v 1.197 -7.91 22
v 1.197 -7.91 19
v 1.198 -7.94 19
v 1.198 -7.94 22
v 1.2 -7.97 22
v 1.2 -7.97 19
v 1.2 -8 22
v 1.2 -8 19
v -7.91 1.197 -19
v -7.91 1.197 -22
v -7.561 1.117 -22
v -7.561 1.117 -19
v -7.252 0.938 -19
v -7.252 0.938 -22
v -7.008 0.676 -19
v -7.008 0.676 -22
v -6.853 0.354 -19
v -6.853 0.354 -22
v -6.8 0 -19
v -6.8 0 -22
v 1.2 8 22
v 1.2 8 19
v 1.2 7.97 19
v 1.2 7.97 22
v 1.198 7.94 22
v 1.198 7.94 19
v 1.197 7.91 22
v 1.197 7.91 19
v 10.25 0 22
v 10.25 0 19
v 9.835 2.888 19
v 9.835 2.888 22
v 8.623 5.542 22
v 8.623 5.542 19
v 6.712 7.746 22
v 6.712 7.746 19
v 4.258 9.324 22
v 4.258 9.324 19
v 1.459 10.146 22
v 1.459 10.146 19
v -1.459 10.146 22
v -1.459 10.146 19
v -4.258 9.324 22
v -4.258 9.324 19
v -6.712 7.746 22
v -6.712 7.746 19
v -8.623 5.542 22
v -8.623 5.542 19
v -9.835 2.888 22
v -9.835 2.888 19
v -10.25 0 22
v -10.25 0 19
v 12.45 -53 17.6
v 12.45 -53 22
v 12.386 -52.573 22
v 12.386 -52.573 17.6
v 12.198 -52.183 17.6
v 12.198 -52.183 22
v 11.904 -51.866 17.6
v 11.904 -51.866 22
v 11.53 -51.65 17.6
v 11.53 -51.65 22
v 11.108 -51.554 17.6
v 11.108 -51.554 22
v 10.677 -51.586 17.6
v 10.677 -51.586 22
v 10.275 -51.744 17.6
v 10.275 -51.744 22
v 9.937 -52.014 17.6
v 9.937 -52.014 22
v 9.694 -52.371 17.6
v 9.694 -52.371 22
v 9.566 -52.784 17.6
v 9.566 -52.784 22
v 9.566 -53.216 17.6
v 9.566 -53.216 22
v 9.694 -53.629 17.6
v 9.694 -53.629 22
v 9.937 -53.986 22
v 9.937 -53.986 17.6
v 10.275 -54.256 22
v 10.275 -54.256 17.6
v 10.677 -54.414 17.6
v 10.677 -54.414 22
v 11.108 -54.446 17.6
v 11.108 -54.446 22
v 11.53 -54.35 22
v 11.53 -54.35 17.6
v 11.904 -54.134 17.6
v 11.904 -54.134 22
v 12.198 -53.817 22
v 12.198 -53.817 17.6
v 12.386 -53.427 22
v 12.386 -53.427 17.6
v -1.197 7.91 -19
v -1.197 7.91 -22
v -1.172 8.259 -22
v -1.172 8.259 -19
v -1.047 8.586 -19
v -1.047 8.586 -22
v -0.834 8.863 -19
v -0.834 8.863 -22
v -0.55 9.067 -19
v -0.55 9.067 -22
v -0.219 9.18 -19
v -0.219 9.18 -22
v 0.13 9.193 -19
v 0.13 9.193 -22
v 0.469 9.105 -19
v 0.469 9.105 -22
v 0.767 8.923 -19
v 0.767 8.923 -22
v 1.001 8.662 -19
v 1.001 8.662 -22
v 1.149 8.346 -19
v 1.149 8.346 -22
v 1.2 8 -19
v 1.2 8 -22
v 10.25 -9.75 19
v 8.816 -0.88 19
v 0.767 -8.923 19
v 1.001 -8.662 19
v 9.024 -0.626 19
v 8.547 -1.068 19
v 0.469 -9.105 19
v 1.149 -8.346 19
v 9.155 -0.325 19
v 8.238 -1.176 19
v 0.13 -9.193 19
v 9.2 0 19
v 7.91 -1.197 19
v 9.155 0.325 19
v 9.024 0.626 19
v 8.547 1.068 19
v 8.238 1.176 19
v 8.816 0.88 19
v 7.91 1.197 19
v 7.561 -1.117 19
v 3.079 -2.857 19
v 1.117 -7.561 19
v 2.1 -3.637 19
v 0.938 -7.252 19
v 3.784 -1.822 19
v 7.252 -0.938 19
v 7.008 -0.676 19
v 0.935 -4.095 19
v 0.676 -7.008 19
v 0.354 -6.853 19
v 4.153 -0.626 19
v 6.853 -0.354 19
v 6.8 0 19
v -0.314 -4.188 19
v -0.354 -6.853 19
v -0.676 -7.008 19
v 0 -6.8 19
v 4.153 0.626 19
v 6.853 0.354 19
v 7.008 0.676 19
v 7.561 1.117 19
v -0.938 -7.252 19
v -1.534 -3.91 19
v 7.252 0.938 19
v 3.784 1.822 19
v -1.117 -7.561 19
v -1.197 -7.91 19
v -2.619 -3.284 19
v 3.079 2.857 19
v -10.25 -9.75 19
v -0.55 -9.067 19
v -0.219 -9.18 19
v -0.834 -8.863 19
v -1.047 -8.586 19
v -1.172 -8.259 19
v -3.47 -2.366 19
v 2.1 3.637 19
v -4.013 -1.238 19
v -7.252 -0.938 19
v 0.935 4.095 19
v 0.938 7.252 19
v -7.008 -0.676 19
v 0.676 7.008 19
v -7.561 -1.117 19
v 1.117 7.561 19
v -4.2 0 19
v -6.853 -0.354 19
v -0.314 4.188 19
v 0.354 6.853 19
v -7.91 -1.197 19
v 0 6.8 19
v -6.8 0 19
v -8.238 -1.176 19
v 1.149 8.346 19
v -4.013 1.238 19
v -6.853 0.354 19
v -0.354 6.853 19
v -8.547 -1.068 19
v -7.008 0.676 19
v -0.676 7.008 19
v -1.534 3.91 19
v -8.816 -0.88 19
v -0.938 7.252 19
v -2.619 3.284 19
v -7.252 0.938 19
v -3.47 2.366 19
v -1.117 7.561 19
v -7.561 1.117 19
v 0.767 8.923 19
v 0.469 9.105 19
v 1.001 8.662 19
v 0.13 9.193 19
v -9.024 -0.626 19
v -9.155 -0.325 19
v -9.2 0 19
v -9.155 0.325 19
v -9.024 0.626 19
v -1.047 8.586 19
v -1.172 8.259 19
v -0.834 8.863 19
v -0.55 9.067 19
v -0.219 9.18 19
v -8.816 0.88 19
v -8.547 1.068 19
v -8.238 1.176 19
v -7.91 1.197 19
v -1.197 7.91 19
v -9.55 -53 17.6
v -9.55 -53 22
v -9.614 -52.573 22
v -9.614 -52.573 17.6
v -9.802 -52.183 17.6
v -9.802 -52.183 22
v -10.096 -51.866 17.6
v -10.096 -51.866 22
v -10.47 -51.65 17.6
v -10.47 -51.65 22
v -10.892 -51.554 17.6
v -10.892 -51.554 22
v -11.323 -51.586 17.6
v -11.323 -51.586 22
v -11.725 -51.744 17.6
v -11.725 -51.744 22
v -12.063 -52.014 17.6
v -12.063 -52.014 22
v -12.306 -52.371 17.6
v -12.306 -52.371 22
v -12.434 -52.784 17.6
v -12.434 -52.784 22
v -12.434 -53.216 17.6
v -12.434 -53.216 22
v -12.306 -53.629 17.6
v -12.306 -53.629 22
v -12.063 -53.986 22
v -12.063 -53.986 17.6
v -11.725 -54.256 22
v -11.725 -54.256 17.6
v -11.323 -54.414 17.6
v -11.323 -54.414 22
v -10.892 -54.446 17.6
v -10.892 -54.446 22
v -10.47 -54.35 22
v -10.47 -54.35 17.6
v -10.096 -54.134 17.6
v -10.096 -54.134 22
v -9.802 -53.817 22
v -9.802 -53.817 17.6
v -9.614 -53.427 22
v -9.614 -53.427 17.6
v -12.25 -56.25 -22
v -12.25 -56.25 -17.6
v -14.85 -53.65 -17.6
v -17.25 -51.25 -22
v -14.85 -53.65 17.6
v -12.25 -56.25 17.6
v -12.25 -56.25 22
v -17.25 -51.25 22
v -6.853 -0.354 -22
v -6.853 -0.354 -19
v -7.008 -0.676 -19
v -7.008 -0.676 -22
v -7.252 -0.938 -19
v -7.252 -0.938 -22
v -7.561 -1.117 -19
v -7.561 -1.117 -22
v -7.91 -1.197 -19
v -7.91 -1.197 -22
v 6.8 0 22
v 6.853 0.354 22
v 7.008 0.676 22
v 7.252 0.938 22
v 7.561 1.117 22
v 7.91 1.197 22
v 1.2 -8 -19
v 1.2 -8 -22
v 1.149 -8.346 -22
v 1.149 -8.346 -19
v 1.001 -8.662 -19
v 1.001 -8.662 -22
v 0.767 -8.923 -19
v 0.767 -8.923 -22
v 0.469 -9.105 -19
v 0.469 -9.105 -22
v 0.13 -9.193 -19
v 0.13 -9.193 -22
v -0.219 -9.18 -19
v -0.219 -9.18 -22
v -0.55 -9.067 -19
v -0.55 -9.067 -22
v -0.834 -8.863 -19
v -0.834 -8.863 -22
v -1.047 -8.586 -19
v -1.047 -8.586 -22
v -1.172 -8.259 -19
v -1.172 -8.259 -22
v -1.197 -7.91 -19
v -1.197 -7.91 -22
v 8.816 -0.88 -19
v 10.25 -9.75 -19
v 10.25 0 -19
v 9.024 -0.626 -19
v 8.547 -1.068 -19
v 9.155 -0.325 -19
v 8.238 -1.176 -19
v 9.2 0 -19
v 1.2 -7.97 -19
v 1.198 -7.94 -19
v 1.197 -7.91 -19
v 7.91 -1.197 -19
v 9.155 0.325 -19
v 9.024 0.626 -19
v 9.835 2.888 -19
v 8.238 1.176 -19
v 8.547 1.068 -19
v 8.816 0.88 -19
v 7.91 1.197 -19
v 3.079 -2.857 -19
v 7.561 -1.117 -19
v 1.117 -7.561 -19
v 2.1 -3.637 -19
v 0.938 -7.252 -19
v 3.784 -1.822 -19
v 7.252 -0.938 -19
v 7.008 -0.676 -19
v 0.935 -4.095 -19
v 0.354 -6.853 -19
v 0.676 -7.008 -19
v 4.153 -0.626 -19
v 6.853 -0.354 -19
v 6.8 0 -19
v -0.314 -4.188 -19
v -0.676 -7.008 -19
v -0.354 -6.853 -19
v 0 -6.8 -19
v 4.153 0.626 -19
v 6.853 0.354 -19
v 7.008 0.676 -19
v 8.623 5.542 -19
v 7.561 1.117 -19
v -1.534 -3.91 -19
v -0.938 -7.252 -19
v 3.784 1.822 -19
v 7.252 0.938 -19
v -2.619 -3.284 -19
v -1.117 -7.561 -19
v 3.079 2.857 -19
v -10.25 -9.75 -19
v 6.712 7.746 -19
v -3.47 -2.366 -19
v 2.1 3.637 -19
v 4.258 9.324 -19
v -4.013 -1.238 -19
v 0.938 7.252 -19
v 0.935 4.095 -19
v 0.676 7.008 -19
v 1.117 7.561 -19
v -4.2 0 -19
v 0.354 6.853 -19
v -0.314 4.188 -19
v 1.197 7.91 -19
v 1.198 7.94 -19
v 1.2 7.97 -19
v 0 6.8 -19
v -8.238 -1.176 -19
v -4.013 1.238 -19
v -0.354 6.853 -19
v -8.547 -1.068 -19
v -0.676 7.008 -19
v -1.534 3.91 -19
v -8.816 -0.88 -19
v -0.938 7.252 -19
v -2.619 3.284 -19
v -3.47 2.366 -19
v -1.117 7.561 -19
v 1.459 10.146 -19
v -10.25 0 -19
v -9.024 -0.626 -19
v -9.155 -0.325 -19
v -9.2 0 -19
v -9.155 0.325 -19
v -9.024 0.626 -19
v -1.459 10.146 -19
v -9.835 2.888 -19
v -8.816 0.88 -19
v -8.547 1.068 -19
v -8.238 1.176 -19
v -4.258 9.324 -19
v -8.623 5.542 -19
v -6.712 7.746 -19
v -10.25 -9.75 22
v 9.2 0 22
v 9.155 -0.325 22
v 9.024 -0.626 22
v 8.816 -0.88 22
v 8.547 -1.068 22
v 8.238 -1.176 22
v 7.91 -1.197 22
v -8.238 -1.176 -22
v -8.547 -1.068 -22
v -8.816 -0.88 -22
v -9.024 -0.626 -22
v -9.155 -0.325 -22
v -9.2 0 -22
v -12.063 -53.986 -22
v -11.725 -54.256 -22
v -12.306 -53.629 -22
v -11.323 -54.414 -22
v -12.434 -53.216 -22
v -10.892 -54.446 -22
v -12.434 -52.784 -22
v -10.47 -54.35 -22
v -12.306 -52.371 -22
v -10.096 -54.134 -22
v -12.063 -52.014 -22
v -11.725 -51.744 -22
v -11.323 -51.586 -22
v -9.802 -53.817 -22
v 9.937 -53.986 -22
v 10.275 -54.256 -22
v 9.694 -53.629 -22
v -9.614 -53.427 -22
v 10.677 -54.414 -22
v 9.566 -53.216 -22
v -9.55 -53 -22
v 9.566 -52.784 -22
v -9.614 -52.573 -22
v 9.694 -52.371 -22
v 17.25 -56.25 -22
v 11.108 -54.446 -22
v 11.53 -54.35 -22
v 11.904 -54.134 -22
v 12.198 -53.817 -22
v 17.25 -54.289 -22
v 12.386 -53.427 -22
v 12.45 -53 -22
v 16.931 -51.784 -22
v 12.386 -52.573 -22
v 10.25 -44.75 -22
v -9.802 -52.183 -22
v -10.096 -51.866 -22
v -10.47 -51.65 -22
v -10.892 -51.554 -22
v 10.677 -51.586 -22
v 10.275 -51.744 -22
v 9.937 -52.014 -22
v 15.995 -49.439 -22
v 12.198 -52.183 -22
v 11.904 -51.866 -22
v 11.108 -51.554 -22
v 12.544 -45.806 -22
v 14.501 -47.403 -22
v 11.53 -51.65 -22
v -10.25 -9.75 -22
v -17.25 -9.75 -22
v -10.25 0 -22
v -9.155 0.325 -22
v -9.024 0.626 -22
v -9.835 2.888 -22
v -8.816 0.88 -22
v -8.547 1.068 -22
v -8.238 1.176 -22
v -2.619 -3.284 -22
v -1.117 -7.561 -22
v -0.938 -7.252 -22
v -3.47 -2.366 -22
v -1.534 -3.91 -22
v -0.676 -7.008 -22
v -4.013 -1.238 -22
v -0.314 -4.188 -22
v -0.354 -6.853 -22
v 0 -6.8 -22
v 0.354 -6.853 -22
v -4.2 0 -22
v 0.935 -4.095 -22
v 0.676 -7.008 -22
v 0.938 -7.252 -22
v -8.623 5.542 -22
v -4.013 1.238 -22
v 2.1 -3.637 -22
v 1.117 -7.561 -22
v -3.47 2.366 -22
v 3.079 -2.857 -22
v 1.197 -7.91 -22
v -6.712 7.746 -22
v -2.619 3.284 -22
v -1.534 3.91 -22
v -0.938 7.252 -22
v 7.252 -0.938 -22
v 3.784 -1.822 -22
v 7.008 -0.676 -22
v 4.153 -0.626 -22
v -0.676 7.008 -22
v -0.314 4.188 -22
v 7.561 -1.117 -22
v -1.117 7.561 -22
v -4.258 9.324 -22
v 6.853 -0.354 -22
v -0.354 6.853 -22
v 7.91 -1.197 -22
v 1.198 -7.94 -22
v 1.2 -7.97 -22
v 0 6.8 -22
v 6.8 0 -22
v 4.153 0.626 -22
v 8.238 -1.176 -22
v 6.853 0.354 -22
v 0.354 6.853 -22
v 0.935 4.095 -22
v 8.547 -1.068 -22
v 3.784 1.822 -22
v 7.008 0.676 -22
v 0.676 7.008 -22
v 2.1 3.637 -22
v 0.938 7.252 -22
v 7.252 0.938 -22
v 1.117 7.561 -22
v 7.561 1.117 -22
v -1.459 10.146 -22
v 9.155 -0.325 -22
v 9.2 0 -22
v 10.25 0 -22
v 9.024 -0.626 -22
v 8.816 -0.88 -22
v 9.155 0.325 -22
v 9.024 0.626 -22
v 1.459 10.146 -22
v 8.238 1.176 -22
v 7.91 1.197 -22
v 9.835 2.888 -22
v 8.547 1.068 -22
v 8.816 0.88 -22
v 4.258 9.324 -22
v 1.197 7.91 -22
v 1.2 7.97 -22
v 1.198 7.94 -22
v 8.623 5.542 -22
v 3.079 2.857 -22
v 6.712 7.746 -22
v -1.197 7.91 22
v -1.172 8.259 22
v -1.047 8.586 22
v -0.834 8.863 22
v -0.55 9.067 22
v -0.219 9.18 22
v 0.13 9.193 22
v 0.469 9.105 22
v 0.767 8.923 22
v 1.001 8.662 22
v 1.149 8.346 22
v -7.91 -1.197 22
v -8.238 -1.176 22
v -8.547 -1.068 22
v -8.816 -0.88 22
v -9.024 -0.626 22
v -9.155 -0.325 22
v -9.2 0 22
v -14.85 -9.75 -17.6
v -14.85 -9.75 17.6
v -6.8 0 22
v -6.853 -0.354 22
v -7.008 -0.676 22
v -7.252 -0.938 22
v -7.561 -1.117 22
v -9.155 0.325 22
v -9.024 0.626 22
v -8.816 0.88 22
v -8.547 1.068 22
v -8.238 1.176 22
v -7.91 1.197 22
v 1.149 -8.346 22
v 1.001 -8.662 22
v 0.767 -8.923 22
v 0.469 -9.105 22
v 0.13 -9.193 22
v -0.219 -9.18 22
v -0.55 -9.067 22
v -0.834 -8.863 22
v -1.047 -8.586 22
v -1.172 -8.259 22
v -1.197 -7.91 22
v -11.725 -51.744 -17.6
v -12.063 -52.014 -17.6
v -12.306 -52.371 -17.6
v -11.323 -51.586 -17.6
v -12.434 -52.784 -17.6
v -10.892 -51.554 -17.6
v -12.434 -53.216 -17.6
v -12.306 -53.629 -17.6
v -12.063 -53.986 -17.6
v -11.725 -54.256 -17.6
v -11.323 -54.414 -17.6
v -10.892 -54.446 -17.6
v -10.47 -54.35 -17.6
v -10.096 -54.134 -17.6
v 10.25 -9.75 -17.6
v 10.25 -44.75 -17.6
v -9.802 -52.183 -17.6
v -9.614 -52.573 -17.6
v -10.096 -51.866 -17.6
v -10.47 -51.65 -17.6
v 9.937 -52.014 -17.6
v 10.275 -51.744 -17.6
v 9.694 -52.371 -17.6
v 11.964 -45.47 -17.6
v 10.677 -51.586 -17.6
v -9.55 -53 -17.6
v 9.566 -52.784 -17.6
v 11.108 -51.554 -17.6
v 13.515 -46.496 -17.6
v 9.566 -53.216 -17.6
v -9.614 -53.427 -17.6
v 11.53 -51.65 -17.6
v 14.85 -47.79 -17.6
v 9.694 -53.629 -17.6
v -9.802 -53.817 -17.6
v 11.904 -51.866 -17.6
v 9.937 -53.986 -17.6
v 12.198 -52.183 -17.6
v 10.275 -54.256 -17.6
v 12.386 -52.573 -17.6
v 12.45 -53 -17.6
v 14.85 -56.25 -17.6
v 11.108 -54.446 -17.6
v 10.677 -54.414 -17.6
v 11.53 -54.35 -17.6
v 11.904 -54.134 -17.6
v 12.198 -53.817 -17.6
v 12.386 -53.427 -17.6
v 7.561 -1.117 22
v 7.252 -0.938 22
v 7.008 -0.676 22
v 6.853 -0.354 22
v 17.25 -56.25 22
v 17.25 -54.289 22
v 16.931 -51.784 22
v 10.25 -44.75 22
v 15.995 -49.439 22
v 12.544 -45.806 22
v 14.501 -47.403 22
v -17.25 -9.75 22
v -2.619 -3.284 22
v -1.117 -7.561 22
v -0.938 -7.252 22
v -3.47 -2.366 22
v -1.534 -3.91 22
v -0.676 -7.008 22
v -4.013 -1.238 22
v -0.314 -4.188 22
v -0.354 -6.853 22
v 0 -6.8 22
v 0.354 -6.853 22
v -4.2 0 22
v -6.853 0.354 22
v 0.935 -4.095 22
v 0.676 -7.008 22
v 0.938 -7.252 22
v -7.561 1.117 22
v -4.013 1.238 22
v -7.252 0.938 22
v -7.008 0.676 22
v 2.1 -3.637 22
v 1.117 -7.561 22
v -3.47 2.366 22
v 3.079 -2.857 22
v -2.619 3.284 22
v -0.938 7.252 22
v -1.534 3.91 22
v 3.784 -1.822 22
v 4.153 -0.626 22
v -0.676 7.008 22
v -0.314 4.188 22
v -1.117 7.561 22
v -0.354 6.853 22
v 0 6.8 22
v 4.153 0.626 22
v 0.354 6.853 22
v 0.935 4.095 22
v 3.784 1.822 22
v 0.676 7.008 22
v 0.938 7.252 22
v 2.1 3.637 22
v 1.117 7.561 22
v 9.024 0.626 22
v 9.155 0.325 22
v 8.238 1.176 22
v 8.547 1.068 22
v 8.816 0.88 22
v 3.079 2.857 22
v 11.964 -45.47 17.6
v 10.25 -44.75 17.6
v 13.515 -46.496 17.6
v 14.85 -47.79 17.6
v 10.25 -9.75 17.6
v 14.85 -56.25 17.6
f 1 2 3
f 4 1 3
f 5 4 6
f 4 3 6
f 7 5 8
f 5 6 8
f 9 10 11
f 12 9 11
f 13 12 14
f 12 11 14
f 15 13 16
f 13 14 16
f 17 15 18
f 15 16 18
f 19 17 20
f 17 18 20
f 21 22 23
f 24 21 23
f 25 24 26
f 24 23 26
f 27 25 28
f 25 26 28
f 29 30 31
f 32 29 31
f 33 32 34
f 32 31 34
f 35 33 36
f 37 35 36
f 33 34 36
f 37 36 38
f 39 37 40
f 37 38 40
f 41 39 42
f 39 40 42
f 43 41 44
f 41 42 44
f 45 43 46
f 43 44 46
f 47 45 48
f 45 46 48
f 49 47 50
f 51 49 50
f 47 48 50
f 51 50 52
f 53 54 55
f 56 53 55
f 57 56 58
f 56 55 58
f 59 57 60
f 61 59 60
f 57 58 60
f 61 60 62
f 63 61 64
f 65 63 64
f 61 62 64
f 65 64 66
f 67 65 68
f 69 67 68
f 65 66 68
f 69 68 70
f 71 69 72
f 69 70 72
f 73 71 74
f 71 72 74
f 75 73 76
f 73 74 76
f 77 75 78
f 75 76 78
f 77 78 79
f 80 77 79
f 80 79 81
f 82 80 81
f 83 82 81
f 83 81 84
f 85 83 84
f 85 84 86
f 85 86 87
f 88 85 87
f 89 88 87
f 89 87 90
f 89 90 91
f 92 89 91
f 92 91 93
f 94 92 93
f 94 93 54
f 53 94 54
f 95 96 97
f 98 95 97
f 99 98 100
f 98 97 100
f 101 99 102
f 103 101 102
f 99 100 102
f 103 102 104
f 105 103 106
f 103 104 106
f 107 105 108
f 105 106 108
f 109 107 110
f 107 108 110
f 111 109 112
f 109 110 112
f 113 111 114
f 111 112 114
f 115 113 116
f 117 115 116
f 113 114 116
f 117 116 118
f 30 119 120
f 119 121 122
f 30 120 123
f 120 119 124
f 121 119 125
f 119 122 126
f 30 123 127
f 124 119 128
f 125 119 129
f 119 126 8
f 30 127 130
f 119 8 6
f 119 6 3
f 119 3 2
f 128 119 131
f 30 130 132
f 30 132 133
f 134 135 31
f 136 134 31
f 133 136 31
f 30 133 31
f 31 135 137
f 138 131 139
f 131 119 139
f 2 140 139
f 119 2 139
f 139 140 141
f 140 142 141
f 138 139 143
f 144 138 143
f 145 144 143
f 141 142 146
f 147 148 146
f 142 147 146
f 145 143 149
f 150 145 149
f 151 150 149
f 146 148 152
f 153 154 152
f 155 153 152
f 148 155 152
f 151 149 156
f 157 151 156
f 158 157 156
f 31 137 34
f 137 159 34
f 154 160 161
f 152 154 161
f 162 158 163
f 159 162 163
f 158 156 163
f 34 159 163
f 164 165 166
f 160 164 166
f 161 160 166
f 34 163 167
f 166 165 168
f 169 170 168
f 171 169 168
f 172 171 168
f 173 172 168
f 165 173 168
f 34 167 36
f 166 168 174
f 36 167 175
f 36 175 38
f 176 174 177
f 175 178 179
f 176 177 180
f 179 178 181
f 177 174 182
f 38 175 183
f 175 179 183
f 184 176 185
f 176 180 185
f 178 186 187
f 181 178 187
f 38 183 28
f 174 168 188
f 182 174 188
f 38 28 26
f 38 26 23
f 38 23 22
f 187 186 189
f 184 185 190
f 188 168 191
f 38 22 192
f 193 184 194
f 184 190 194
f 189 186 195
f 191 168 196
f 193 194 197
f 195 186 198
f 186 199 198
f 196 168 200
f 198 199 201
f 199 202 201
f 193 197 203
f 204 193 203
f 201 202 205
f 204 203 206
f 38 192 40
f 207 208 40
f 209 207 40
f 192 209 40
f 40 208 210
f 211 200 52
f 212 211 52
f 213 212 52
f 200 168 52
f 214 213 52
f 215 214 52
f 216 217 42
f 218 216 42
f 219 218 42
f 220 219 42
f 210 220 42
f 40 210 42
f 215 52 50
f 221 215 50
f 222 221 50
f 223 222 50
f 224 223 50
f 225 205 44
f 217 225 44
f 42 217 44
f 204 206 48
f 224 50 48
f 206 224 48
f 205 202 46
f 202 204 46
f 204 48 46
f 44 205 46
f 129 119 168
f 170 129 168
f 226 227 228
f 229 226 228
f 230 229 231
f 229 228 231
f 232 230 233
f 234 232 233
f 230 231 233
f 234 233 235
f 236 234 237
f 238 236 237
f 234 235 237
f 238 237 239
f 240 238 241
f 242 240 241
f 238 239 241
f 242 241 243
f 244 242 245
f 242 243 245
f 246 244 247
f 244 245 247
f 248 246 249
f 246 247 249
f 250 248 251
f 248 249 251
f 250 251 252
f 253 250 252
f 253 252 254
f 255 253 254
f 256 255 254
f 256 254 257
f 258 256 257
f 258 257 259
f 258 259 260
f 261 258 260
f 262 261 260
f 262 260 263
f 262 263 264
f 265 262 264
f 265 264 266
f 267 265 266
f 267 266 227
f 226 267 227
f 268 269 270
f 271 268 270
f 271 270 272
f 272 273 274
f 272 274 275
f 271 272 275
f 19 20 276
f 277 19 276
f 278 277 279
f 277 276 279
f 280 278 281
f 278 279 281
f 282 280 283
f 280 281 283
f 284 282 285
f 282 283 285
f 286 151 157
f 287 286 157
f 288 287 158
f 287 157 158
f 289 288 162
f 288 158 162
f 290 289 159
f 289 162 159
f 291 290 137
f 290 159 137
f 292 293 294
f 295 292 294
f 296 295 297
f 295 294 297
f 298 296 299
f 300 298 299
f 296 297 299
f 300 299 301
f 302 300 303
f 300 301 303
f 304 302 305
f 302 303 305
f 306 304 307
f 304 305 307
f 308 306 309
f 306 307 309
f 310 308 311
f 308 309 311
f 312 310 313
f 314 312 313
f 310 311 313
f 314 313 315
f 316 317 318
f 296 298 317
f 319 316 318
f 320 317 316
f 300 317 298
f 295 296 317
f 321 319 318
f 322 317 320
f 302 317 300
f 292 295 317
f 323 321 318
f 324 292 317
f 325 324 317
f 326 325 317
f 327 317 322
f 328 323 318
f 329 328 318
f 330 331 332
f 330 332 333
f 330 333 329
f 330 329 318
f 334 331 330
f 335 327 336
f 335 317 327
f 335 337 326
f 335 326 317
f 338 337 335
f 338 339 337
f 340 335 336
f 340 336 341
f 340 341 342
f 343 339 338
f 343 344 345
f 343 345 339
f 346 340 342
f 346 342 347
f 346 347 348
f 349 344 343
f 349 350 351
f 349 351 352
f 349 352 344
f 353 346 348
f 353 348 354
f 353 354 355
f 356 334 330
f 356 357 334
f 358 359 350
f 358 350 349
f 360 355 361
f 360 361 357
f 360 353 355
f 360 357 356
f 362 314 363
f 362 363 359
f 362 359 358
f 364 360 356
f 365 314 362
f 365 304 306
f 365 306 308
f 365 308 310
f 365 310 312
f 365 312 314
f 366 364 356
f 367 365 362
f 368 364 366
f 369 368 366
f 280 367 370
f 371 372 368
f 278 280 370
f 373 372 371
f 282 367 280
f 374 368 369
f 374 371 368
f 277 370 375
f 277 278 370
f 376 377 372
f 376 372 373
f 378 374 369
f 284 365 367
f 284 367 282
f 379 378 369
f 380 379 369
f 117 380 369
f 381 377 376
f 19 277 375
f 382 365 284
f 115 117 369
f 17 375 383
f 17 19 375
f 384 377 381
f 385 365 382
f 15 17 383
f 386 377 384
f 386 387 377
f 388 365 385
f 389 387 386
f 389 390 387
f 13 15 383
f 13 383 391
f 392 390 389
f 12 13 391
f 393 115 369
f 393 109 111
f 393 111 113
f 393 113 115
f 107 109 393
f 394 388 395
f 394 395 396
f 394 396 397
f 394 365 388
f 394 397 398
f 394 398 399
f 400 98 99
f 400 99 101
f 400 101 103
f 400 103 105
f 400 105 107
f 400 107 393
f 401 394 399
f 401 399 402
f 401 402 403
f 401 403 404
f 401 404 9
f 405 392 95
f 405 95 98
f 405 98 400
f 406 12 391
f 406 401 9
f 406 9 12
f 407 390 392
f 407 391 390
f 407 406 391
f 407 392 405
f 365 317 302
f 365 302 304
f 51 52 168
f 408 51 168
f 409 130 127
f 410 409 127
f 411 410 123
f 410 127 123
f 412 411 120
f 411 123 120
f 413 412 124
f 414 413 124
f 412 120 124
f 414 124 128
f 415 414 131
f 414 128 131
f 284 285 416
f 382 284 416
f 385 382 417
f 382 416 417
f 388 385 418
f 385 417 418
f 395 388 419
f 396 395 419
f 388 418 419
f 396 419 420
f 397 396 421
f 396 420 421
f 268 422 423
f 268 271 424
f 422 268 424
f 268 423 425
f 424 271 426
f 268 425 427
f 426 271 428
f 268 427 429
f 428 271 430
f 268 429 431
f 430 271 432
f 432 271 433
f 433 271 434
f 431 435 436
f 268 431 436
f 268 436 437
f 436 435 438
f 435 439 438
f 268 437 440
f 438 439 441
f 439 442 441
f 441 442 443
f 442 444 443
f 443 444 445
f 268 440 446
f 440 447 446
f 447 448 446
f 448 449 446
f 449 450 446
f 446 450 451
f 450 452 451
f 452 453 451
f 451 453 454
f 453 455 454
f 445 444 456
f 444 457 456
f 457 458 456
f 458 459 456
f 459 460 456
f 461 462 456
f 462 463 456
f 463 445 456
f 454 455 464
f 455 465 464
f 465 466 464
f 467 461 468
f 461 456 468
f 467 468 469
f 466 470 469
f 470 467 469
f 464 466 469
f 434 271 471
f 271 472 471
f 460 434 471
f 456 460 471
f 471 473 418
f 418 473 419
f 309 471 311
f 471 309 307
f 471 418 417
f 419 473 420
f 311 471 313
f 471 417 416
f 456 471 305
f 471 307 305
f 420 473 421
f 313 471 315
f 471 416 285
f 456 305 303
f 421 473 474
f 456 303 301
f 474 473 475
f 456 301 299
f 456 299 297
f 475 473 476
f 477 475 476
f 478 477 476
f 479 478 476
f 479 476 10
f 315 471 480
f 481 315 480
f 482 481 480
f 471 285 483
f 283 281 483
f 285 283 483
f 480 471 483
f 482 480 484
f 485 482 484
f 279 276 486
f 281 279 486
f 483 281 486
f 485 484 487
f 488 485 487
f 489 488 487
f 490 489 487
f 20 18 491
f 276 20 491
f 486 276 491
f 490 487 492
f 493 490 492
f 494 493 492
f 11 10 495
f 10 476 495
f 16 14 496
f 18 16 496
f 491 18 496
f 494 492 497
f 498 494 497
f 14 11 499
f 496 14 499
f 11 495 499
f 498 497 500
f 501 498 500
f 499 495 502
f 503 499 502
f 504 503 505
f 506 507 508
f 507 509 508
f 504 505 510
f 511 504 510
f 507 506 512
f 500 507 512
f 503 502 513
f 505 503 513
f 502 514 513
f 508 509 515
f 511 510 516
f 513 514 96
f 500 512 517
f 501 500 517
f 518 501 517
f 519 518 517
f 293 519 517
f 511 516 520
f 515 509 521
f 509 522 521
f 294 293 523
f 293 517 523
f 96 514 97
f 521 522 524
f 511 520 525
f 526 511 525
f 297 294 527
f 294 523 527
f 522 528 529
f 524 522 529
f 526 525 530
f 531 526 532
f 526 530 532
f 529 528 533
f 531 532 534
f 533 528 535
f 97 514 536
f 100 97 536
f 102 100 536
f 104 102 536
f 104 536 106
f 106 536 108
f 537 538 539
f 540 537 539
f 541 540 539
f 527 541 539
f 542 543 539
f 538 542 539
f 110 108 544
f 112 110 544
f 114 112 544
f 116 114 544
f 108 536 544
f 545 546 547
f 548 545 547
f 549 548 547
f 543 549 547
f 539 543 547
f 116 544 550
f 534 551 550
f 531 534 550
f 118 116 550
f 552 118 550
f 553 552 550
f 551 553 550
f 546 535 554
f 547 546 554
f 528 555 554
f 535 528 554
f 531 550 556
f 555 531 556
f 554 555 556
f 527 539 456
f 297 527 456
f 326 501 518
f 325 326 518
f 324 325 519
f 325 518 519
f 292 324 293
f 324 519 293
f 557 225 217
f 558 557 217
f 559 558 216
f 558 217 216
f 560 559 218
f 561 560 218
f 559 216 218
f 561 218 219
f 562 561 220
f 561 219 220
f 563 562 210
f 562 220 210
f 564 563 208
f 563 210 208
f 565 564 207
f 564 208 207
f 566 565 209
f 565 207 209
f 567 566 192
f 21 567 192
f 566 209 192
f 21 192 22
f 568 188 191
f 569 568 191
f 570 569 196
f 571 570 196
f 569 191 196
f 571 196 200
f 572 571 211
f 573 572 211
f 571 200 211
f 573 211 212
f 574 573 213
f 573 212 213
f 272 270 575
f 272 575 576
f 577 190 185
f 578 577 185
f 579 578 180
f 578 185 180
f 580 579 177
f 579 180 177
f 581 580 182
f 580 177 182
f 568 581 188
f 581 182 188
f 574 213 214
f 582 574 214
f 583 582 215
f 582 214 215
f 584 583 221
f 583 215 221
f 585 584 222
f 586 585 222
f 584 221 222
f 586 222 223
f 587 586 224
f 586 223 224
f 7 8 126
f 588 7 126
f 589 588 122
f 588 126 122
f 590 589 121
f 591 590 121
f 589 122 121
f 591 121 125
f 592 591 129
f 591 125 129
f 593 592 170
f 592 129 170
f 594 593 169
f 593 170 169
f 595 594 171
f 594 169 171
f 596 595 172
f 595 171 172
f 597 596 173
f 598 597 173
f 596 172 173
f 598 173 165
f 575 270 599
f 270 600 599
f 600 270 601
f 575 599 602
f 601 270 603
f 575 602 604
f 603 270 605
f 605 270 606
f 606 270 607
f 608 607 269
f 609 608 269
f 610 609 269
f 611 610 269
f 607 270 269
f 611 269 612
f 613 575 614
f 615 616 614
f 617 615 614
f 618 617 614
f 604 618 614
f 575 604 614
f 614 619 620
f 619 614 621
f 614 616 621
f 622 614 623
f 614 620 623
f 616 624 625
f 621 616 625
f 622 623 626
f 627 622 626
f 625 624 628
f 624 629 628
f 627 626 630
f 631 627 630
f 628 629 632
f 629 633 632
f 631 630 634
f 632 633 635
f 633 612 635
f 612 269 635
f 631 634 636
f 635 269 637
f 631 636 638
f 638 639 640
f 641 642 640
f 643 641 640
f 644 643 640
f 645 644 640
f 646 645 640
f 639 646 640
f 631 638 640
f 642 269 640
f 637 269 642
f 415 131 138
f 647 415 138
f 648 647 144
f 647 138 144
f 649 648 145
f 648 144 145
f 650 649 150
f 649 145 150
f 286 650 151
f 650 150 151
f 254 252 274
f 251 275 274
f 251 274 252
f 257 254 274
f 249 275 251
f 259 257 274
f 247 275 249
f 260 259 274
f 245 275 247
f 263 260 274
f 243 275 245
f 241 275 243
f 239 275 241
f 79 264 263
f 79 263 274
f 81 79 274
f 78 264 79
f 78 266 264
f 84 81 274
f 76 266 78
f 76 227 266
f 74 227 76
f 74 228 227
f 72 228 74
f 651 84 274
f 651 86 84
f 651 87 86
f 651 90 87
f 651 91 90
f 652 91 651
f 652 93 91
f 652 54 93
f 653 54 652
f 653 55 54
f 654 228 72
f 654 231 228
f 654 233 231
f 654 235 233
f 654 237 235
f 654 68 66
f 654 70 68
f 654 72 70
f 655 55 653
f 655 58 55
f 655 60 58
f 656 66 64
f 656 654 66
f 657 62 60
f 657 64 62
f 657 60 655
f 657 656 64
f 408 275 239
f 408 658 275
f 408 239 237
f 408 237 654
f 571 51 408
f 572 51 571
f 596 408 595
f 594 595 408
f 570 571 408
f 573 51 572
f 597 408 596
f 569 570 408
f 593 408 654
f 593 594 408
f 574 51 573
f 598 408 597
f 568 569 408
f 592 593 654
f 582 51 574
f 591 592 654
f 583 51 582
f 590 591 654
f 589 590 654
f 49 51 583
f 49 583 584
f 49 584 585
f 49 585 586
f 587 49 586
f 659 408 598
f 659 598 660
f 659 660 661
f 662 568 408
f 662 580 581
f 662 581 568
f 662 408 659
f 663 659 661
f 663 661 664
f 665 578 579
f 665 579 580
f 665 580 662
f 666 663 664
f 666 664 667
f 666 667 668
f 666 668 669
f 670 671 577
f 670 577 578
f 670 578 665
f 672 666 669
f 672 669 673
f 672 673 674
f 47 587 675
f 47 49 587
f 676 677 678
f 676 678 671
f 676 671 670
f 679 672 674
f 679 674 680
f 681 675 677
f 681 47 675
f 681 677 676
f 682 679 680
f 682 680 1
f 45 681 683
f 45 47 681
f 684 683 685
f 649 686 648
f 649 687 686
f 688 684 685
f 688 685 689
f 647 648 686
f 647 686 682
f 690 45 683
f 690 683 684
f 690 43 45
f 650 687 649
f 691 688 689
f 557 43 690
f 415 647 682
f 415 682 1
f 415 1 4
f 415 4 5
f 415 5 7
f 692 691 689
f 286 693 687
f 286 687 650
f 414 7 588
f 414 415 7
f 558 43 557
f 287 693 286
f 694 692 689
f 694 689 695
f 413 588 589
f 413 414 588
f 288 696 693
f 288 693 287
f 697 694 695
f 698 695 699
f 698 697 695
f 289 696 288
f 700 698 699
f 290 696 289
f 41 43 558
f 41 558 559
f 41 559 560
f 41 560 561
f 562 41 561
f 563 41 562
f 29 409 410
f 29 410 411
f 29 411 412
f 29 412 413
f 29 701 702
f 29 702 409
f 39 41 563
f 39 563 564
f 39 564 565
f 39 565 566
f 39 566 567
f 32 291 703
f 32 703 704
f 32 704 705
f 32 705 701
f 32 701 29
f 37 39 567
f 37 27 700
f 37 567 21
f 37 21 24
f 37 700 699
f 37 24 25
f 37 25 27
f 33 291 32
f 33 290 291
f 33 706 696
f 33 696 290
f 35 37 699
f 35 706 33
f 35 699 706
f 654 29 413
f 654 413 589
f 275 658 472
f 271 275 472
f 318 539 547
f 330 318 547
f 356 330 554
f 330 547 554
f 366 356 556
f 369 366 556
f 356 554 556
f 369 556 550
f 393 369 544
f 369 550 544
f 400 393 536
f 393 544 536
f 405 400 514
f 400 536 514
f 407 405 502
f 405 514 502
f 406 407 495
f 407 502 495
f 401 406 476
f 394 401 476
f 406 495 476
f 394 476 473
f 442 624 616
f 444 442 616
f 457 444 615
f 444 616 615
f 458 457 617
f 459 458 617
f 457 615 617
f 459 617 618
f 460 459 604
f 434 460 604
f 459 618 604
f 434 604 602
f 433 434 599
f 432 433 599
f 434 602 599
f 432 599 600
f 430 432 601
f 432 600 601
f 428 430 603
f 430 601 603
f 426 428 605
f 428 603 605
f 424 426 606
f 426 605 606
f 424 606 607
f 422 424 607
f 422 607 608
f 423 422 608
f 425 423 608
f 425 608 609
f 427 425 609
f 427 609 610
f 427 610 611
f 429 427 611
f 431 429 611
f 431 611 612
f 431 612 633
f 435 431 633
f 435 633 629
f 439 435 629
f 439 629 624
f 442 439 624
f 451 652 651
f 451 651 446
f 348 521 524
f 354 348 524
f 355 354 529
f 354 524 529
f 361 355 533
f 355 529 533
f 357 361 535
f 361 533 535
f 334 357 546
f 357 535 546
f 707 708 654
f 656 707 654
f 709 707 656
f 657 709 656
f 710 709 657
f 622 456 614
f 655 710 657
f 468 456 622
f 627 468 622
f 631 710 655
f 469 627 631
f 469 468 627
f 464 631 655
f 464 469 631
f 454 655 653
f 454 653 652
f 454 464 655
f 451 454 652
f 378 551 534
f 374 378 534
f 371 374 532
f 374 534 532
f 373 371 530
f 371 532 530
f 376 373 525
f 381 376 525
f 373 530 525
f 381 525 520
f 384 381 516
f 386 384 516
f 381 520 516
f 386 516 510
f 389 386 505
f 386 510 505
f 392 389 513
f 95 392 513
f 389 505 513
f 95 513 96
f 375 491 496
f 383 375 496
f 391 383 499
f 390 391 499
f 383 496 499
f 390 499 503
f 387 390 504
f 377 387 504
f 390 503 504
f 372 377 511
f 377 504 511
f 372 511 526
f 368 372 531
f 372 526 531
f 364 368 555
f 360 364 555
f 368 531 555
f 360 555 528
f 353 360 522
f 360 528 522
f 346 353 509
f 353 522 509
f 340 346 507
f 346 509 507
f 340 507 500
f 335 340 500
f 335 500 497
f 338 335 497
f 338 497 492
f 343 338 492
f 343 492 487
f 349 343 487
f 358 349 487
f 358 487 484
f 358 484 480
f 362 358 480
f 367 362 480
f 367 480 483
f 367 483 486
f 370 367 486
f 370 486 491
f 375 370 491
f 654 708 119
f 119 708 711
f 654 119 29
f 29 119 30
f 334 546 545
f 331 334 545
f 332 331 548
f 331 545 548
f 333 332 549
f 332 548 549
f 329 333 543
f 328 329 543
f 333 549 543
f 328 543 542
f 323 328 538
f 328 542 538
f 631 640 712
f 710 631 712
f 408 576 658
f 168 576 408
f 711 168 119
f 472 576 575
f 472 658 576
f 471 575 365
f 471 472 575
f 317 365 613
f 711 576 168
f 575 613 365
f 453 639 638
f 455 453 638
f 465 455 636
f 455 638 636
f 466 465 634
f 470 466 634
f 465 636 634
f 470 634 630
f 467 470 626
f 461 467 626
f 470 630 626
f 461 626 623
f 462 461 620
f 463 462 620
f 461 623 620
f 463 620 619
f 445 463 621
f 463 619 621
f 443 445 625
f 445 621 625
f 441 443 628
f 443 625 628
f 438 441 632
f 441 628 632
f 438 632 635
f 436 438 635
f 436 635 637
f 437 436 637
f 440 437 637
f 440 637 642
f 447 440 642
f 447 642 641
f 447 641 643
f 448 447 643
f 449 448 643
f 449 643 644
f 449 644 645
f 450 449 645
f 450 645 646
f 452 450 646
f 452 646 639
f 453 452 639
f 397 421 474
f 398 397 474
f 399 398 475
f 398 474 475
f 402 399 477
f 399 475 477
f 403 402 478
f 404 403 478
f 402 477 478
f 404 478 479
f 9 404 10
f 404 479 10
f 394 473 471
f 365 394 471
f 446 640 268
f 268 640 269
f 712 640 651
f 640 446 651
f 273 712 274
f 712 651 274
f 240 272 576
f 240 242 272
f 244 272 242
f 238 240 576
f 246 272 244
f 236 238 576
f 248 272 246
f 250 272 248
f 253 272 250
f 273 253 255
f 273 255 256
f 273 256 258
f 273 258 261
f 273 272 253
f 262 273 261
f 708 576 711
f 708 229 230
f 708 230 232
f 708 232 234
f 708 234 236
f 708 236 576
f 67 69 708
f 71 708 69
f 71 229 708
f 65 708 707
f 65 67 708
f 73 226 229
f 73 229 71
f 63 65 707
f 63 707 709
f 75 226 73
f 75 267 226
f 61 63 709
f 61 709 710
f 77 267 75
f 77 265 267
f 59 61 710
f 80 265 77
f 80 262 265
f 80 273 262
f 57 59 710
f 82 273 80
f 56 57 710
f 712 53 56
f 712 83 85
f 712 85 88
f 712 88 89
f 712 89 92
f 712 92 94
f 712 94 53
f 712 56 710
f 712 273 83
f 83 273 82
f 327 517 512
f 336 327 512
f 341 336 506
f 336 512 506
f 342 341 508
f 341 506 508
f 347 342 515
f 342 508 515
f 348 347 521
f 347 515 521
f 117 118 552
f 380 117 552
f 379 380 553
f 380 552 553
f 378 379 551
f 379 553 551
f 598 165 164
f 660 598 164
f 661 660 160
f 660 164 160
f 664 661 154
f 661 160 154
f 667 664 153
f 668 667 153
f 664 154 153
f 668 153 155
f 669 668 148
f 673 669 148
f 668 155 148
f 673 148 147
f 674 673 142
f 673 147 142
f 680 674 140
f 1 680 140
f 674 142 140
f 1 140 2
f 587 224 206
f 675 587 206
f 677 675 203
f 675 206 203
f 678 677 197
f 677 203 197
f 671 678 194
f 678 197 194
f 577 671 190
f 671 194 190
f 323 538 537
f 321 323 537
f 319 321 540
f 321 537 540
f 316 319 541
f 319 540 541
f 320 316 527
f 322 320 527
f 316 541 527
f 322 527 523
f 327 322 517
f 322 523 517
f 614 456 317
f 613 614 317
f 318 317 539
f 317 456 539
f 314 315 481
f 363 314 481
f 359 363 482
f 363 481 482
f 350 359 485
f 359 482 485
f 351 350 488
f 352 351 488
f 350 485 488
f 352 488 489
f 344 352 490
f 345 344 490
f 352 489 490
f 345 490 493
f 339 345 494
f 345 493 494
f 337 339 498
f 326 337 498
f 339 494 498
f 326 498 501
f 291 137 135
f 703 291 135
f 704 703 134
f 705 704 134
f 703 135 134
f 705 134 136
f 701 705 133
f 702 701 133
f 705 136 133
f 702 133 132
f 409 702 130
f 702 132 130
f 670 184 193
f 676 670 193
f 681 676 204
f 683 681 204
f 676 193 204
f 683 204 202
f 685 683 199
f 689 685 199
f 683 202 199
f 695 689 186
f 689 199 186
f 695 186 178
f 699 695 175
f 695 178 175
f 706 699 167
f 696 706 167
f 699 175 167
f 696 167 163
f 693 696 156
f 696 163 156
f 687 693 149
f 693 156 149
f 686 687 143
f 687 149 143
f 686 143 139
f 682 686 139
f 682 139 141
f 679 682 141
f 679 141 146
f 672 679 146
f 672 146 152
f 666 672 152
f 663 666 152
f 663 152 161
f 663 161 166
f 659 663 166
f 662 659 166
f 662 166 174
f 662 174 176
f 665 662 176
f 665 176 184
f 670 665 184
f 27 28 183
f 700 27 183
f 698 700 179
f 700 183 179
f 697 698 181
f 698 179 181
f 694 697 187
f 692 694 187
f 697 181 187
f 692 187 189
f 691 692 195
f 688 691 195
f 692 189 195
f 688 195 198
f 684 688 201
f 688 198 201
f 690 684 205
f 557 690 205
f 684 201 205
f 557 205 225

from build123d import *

# Parameters (mm, degrees)
BOSS_EXTRUDE1_DEPTH      = 22
BOSS_EXTRUDE1_DEPTH_BACK = 22
SKETCH2_W                = 38
SKETCH2_H                = 20
CUT_EXTRUDE1_DEPTH       = 105.423416914
SKETCH3_W                = 7
SKETCH3_H                = 44
BOSS_EXTRUDE2_DEPTH      = 65.5
SKETCH23_R               = 5
SKETCH23_R_2             = 1.2
CUT_EXTRUDE2_DEPTH       = 111.605436123
SKETCH24_W               = 28.5
SKETCH24_H               = 34
CUT_EXTRUDE3_DEPTH       = 90.954502389
SKETCH26_R               = 1.2
SKETCH26_R_2             = 5
SKETCH26_R_3             = 1.45
CUT_EXTRUDE6_DEPTH       = 107.330263801
SKETCH27_W               = 29.7
SKETCH27_H               = 35.2
CUT_EXTRUDE8_DEPTH       = 73.137455597
SKETCH29_W               = 7
SKETCH29_H               = 35
CUT_EXTRUDE10_DEPTH      = 74.468530678
CHAMFER2_SIZE            = 5
FILLET1_START            = -23
FILLET1_DEPTH            = 46


with BuildPart() as part:
    # Sketch1 → Boss-Extrude1 (new, two sides: drawn at the far end of the back side and taken through both)
    with BuildSketch(Plane.XY.offset(-BOSS_EXTRUDE1_DEPTH_BACK)):
        with BuildLine():
            Line((10.25, -60), (10.25, 0))
            ThreePointArc((10.25, 0), (0, -10.25), (-10.25, 0))
            Line((-10.25, 0), (-10.25, -60))
            Line((-10.25, -60), (-10.25, -100))
            Line((-10.25, -100), (10.25, -100))
            Line((10.25, -100), (10.25, -60))
        make_face()
        with BuildLine():
            Line((10.25, 0), (9.2, 0))
            ThreePointArc((9.2, 0), (8.816088231, -0.879772698), (7.91, -1.196620241))
            ThreePointArc((7.91, -1.196620241), (5.656854249, -5.656854249), (1.196620241, -7.91))
            ThreePointArc((1.196620241, -7.91), (1.199154762, -7.954968281), (1.2, -8))
            ThreePointArc((1.2, -8), (-0.045031719, -9.199154762), (-1.196620241, -7.91))
            ThreePointArc((-1.196620241, -7.91), (-5.656854249, -5.656854249), (-7.91, -1.196620241))
            ThreePointArc((-7.91, -1.196620241), (-8.816088231, -0.879772698), (-9.2, 0))
            Line((-9.2, 0), (-10.25, 0))
            ThreePointArc((-10.25, 0), (0, -10.25), (10.25, 0))
        make_face()
        with BuildLine():
            ThreePointArc((7.91, -1.196620241), (7.120227302, -0.816088231), (6.8, 0))
            Line((6.8, 0), (4.2, 0))
            ThreePointArc((4.2, 0), (0, -4.2), (-4.2, 0))
            Line((-4.2, 0), (-6.8, 0))
            ThreePointArc((-6.8, 0), (-7.120227302, -0.816088231), (-7.91, -1.196620241))
            ThreePointArc((-7.91, -1.196620241), (-5.656854249, -5.656854249), (-1.196620241, -7.91))
            ThreePointArc((-1.196620241, -7.91), (0, -6.8), (1.196620241, -7.91))
            ThreePointArc((1.196620241, -7.91), (5.656854249, -5.656854249), (7.91, -1.196620241))
        make_face()
        with BuildLine():
            Line((4.2, 0), (6.8, 0))
            ThreePointArc((6.8, 0), (7.120227302, 0.816088231), (7.91, 1.196620241))
            ThreePointArc((7.91, 1.196620241), (5.656854249, 5.656854249), (1.196620241, 7.91))
            ThreePointArc((1.196620241, 7.91), (0, 6.8), (-1.196620241, 7.91))
            ThreePointArc((-1.196620241, 7.91), (-5.656854249, 5.656854249), (-7.91, 1.196620241))
            ThreePointArc((-7.91, 1.196620241), (-7.120227302, 0.816088231), (-6.8, 0))
            Line((-6.8, 0), (-4.2, 0))
            ThreePointArc((-4.2, 0), (0, 4.2), (4.2, 0))
        make_face()
        with BuildLine():
            ThreePointArc((7.91, 1.196620241), (8.816088231, 0.879772698), (9.2, 0))
            Line((9.2, 0), (10.25, 0))
            ThreePointArc((10.25, 0), (0, 10.25), (-10.25, 0))
            Line((-10.25, 0), (-9.2, 0))
            ThreePointArc((-9.2, 0), (-8.816088231, 0.879772698), (-7.91, 1.196620241))
            ThreePointArc((-7.91, 1.196620241), (-5.656854249, 5.656854249), (-1.196620241, 7.91))
            ThreePointArc((-1.196620241, 7.91), (-0.045031719, 9.199154762), (1.2, 8))
            ThreePointArc((1.2, 8), (1.199154762, 7.954968281), (1.196620241, 7.91))
            ThreePointArc((1.196620241, 7.91), (5.656854249, 5.656854249), (7.91, 1.196620241))
        make_face()
    extrude(amount=BOSS_EXTRUDE1_DEPTH + BOSS_EXTRUDE1_DEPTH_BACK)

    # Sketch2 → Cut-Extrude1 (cut, through all)
    with BuildSketch(Plane.ZY.offset(10.25)):
        with Locations((0, 0.25)):
            Rectangle(SKETCH2_W, SKETCH2_H)
    extrude(amount=-CUT_EXTRUDE1_DEPTH, mode=Mode.SUBTRACT)

    # Sketch3 → Boss-Extrude2 (add)
    with BuildSketch(Plane(origin=(0, -9.75, 0), x_dir=(1, 0, 0), z_dir=(0, 1, 0))):
        with Locations((-13.75, 0)):
            Rectangle(SKETCH3_W, SKETCH3_H)
        with Locations((13.75, 0)):
            Rectangle(SKETCH3_W, SKETCH3_H)
    extrude(amount=-BOSS_EXTRUDE2_DEPTH)

    # Sketch23 → Cut-Extrude2 (cut, through all)
    with BuildSketch(Plane.XY.offset(22)):
        with BuildLine():
            Line((-10.25, -100), (10.25, -100))
            Line((10.25, -100), (10.25, -85))
            ThreePointArc((10.25, -85), (0, -95.25), (-10.25, -85))
            Line((-10.25, -85), (-10.25, -100))
        make_face()
        with Locations((0, -85)):
            Circle(SKETCH23_R)
        with Locations((8, -85)):
            Circle(SKETCH23_R_2)
        with Locations((0, -77)):
            Circle(SKETCH23_R_2)
        with Locations((0, -93)):
            Circle(SKETCH23_R_2)
        with Locations((-8, -85)):
            Circle(SKETCH23_R_2)
    extrude(amount=-CUT_EXTRUDE2_DEPTH, mode=Mode.SUBTRACT)

    # Sketch24 → Cut-Extrude3 (cut, through all)
    with BuildSketch(Plane(origin=(0, -9.75, 0), x_dir=(1, 0, 0), z_dir=(0, 1, 0))):
        Rectangle(SKETCH24_W, SKETCH24_H)
    extrude(amount=-CUT_EXTRUDE3_DEPTH, mode=Mode.SUBTRACT)

    # Sketch26 → Cut-Extrude6 (cut, through all)
    # profile 1 of 5: a face of its own
    with BuildSketch(Plane.XY.offset(22)):
        with BuildLine():
            Line((10.25, -75.25), (14.25, -75.25))
            Line((14.25, -75.25), (14.25, -56.53282359))
            Line((14.25, -56.53282359), (14.25, -56.25))
            Line((14.25, -56.25), (-14.25, -56.25))
            Line((-14.25, -56.25), (-14.25, -56.53282359))
            Line((-14.25, -56.53282359), (-14.25, -75.25))
            Line((-14.25, -75.25), (-10.25, -75.25))
            Line((-10.25, -75.25), (-10.25, -85))
            ThreePointArc((-10.25, -85), (0, -95.25), (10.25, -85))
            Line((10.25, -85), (10.25, -75.25))
        make_face()
        with Locations((-8, -85)):
            Circle(SKETCH26_R, mode=Mode.SUBTRACT)
        with Locations((0, -85)):
            Circle(SKETCH26_R_2, mode=Mode.SUBTRACT)
        with Locations((0, -77)):
            Circle(SKETCH26_R, mode=Mode.SUBTRACT)
        with Locations((0, -93)):
            Circle(SKETCH26_R, mode=Mode.SUBTRACT)
        with Locations((8, -85)):
            Circle(SKETCH26_R, mode=Mode.SUBTRACT)
    # profile 2 of 5: a face of its own
    with BuildSketch(Plane.XY.offset(22)):
        Polygon((-17.25, -75.25), (-14.25, -75.25), (-14.25, -56.53282359), (-14.25, -56.25), (-17.25, -56.25), align=None)
    # profile 3 of 5: a face of its own
    with BuildSketch(Plane.XY.offset(22)):
        Polygon((14.25, -56.53282359), (14.25, -75.25), (17.25, -75.25), (17.25, -56.25), (14.25, -56.25), align=None)
    # profile 4 of 5: a face of its own
    with BuildSketch(Plane.XY.offset(22)):
        with Locations((-11, -53)):
            Circle(SKETCH26_R_3)
    # profile 5 of 5: a face of its own
    with BuildSketch(Plane.XY.offset(22)):
        with Locations((11, -53)):
            Circle(SKETCH26_R_3)
    extrude(amount=-CUT_EXTRUDE6_DEPTH, mode=Mode.SUBTRACT)

    # Sketch27 → Cut-Extrude8 (cut, through all)
    with BuildSketch(Plane.XZ.offset(56.25)):
        Rectangle(SKETCH27_W, SKETCH27_H)
    extrude(amount=-CUT_EXTRUDE8_DEPTH, mode=Mode.SUBTRACT)

    # Sketch29 → Cut-Extrude10 (cut, through all)
    with BuildSketch(Plane(origin=(0, 0, -22), x_dir=(-1, 0, 0), z_dir=(0, 0, -1))):
        with Locations((-13.75, -27.25)):
            Rectangle(SKETCH29_W, SKETCH29_H)
    extrude(amount=-CUT_EXTRUDE10_DEPTH, mode=Mode.SUBTRACT)

    # Chamfer2
    # the kernel refuses this chamfer: 5 mm, written as the material it takes off along each edge
    with BuildSketch(Plane(origin=(-17.25, -56.25, 34.85841494), x_dir=(1, 0, 0), z_dir=(0, 0, -1))) as chamfer2_piece_1:
        Polygon((CHAMFER2_SIZE, 0), (0, -CHAMFER2_SIZE), (0, 0), align=None)
    extrude(amount=69.71682988, mode=Mode.SUBTRACT)

    # Fillet1: read off the stored shape, not the designer's step
    # Fillet1 outline → Fillet1 (cut)
    with BuildSketch(Plane.XY.offset(FILLET1_START)):
        with BuildLine():
            ThreePointArc((10.25, -44.75), (15.312257748, -48.373312231), (17.25, -54.289392014))
            Line((17.25, -54.289392014), (17.25, -44.75))
            Line((17.25, -44.75), (10.25, -44.75))
        make_face()
    extrude(amount=FILLET1_DEPTH, mode=Mode.SUBTRACT)


solid = part.part
